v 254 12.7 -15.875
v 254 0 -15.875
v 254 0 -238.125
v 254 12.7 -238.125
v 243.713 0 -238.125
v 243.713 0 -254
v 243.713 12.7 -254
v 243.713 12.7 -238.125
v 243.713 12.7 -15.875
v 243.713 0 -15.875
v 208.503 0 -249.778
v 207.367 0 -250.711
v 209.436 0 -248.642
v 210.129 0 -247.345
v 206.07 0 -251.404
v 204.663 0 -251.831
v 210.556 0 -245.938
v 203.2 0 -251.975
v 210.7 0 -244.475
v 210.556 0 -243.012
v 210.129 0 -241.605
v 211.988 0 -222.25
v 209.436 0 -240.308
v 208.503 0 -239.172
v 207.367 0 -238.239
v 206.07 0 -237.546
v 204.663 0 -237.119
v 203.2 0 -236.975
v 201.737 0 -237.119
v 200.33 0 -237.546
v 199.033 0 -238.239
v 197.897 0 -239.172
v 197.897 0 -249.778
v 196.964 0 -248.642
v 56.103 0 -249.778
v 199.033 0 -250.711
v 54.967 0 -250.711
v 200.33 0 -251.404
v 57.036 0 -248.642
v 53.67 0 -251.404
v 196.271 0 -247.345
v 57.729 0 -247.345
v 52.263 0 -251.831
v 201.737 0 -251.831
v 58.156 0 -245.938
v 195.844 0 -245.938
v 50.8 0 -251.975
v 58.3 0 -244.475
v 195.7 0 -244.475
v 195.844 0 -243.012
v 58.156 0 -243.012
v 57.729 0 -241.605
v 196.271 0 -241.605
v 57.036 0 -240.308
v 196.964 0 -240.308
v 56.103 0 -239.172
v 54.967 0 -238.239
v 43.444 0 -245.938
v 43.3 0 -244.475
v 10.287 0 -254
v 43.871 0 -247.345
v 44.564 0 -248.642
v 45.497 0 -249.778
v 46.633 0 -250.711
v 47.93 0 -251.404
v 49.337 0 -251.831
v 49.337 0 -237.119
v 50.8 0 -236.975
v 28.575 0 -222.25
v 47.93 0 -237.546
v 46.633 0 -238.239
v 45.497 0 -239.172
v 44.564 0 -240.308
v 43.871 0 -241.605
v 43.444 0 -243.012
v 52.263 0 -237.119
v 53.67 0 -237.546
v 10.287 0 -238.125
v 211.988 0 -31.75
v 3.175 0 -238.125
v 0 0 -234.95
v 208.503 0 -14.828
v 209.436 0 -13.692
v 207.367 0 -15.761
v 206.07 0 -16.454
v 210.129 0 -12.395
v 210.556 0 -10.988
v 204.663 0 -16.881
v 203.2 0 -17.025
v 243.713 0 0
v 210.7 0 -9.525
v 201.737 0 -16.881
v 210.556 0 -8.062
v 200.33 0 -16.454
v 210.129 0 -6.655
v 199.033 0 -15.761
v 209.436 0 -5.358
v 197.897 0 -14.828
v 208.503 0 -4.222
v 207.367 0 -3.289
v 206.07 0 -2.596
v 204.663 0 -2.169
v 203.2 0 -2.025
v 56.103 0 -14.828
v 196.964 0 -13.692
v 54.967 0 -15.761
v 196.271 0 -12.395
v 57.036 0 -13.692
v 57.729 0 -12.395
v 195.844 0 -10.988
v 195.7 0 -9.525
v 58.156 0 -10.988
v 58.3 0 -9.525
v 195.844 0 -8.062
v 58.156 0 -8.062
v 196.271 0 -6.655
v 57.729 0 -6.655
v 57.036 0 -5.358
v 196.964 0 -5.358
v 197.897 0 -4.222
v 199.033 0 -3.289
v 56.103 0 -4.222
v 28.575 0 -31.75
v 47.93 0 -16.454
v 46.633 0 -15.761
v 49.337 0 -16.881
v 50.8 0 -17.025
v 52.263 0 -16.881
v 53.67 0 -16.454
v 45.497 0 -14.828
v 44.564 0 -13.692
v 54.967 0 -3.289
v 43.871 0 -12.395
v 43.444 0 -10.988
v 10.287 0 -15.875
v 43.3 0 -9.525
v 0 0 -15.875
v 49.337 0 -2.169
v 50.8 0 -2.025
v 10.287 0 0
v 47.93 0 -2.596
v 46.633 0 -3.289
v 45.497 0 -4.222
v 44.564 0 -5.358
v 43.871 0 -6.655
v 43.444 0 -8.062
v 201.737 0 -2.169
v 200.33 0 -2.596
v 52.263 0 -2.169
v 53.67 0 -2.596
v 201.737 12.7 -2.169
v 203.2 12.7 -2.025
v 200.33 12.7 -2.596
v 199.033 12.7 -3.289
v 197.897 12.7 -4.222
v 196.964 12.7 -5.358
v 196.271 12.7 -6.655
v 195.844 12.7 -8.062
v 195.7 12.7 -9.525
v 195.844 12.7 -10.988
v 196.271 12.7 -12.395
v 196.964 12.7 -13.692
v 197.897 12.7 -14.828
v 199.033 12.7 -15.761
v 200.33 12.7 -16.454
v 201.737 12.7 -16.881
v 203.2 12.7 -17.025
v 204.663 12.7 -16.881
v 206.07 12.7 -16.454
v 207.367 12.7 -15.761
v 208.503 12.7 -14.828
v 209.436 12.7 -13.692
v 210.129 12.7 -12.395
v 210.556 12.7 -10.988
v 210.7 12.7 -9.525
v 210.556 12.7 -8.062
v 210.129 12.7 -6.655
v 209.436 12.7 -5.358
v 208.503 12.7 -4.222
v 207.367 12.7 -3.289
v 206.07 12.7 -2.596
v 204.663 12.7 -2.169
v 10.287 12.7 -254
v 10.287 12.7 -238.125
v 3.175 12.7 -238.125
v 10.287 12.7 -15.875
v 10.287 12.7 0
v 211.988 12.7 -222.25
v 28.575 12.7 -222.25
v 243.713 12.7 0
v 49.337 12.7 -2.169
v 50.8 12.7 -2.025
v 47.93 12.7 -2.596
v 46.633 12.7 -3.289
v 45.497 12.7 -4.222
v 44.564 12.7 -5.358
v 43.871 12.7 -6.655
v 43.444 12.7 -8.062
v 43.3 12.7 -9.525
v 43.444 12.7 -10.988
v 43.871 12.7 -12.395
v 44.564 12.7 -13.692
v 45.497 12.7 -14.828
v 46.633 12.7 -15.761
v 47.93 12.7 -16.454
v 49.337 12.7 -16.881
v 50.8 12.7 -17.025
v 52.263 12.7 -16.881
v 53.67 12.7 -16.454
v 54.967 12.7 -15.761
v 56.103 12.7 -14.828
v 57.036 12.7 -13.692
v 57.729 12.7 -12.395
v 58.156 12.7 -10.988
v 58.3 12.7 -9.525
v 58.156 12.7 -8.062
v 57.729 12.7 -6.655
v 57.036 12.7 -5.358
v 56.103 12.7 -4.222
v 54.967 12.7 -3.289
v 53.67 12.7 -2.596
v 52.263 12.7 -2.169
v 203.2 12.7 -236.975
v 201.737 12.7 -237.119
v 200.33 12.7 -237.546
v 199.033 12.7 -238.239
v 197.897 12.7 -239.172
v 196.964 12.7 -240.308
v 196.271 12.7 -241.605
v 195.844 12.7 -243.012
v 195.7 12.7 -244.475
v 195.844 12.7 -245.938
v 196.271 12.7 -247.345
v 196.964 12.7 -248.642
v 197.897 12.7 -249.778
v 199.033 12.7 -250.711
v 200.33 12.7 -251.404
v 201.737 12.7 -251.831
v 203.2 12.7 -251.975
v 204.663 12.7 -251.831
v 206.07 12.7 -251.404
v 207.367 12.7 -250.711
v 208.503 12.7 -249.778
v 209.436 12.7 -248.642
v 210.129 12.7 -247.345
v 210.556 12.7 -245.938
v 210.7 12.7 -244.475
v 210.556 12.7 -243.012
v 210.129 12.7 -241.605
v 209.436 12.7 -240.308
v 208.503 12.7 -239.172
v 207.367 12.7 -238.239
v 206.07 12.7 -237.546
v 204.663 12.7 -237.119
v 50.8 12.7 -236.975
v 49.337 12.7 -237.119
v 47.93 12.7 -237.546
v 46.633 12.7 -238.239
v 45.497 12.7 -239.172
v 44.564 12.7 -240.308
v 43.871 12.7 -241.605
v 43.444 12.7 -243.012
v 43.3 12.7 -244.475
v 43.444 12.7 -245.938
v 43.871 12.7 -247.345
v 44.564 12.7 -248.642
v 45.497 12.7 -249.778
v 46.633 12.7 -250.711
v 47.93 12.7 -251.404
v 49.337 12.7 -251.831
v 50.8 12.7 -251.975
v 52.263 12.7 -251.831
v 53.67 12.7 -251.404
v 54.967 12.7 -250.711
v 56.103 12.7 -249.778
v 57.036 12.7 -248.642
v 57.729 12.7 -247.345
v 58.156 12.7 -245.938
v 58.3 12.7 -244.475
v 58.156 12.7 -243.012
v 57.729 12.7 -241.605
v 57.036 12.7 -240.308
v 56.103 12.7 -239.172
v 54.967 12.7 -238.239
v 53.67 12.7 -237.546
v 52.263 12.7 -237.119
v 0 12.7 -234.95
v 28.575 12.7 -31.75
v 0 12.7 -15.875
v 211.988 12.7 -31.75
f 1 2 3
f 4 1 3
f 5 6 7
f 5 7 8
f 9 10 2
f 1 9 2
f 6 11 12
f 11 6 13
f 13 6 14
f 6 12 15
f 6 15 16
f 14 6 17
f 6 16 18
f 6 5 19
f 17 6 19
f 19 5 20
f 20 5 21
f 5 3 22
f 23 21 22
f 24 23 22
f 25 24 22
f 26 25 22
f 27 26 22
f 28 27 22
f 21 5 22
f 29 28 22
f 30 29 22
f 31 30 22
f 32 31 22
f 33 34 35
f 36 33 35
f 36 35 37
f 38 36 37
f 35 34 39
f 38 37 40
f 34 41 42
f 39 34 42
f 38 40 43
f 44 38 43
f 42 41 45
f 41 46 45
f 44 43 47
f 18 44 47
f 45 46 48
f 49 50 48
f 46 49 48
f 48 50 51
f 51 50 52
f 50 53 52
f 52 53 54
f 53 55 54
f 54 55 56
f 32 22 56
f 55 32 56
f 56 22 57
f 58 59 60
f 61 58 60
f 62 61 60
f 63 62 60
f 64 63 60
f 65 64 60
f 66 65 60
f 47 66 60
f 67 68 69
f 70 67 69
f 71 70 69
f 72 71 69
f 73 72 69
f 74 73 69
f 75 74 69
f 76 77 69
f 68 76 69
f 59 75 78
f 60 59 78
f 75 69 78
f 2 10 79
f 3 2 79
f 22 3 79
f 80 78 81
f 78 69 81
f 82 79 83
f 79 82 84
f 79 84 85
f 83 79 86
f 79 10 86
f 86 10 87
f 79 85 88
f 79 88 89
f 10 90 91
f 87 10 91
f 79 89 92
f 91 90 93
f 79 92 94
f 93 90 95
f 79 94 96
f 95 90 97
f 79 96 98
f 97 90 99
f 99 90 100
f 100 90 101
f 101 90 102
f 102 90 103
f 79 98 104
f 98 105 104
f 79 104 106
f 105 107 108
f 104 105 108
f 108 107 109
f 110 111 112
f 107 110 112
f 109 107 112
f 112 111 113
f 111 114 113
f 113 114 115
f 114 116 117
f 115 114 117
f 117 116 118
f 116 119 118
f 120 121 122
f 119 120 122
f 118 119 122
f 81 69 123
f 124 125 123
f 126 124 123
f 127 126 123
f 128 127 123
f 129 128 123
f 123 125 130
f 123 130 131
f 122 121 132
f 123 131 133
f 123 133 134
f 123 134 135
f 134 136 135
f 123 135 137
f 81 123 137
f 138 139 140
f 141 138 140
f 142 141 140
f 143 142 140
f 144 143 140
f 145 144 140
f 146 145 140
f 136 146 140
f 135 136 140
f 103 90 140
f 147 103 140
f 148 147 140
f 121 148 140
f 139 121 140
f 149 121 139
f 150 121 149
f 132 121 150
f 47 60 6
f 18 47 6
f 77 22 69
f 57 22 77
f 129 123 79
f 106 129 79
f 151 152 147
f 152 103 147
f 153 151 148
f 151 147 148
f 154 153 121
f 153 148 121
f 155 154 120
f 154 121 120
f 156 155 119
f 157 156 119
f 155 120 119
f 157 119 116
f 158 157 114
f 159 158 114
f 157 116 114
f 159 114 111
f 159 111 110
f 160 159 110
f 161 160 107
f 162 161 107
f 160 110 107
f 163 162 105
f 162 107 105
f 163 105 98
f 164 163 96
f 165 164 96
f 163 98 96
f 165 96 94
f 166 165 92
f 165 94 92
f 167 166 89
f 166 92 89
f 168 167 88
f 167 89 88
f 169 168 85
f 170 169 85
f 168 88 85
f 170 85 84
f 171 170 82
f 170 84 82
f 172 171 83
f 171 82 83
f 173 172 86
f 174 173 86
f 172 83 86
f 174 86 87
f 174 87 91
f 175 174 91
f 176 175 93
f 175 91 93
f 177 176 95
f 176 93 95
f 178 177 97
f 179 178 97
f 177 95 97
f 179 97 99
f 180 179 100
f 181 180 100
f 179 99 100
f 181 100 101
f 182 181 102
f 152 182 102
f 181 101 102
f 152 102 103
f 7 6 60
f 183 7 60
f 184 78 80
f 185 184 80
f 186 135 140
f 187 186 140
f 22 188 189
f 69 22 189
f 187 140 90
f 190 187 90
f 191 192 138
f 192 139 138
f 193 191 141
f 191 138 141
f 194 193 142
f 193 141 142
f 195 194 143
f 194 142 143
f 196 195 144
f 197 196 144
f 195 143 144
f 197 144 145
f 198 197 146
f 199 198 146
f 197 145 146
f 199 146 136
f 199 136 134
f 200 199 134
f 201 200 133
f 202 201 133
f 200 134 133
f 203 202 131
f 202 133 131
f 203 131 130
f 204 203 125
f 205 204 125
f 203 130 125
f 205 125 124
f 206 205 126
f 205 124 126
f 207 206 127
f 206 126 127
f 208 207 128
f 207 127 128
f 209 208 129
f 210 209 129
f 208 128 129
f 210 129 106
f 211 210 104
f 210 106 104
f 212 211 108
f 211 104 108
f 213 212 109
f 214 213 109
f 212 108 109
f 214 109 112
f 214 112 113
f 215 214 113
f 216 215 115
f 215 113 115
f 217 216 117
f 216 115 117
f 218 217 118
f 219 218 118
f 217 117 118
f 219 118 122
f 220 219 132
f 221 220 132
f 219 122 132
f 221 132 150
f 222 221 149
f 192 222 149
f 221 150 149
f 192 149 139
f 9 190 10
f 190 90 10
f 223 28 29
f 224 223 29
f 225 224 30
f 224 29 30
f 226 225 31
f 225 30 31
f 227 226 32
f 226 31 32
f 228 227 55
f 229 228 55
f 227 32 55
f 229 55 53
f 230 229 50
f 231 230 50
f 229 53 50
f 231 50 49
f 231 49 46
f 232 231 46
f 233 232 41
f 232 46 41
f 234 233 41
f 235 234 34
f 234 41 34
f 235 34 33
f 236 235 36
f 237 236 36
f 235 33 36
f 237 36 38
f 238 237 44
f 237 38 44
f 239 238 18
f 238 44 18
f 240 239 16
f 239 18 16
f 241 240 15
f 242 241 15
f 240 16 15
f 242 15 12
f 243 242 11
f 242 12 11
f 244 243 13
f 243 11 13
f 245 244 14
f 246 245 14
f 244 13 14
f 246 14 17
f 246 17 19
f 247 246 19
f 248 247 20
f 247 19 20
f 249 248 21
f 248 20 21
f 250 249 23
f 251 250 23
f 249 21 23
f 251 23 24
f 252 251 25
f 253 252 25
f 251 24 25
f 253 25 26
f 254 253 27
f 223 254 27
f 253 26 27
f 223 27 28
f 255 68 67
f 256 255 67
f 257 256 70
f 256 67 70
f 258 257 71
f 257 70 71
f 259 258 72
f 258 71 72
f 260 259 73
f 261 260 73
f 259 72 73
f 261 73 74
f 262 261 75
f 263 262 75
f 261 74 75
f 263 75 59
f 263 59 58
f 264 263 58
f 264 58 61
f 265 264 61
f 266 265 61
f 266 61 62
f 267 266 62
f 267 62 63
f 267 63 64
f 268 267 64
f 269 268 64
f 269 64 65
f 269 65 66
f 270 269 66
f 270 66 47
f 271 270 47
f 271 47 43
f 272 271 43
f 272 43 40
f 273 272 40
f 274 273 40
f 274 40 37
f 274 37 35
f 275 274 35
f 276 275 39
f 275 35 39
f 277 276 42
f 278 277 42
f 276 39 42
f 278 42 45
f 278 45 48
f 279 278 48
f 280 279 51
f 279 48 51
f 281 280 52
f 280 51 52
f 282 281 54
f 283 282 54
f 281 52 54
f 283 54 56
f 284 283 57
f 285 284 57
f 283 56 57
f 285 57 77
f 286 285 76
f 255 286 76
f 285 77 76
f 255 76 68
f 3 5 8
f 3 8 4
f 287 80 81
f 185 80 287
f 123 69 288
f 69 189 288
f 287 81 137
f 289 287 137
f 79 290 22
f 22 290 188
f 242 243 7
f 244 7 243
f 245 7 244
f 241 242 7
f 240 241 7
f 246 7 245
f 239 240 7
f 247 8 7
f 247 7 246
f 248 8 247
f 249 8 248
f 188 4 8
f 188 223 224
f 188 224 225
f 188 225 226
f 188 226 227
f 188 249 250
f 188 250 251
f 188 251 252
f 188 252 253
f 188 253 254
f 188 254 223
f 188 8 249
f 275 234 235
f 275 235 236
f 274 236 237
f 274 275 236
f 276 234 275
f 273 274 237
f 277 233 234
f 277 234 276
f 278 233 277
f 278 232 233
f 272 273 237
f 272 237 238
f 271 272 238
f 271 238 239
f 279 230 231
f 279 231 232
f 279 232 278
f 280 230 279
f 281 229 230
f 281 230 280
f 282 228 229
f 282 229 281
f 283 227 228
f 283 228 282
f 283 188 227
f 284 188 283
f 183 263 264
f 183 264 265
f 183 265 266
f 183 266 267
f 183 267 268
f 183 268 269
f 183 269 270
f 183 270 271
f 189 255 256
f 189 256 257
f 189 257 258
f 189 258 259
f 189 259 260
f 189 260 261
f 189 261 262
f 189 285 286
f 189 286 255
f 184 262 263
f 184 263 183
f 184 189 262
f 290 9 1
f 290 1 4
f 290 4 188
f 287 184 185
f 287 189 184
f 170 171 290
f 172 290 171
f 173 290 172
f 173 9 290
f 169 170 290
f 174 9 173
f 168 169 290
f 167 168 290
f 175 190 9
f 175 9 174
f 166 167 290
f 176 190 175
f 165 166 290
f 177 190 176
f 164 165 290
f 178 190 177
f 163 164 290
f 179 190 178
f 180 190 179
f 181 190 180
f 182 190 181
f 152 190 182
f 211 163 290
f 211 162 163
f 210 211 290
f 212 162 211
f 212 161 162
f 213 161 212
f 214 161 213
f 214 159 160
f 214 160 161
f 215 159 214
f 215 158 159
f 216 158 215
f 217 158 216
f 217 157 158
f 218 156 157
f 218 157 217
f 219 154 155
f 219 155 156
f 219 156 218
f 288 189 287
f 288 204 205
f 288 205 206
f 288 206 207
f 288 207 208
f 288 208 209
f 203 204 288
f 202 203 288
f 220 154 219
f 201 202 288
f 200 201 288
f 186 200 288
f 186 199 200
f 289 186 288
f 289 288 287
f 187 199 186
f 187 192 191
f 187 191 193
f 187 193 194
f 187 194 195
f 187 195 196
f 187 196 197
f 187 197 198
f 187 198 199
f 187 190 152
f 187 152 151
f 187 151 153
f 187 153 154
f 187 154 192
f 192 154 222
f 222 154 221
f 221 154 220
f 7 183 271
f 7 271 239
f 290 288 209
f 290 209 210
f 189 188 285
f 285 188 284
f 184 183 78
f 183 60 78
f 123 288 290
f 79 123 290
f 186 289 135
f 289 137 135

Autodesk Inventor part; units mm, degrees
ref_plane "YZ Plane" through (0, 0, 0) normal (1, 0, 0) x (0, 1, 0)
ref_plane "XZ Plane" through (0, 0, 0) normal (0, 1, 0) x (-1, 0, 0)
ref_plane "XY Plane" through (0, 0, 0) normal (0, 0, 1) x (1, 0, 0)
sketch "Sketch1" plane through (0, 0, 0) normal (0, 1, 0) x (-1, 0, 0)
  line L0 (0, 0) -> (-254, 0)
  line L1 (-254, 0) -> (-254, -254)
  line L2 (-254, -254) -> (0, -254)
  line L3 (0, -254) -> (0, 0)
  line L4 (0, -15.875) -> (-10.287, -15.875)
  line L5 (-10.287, -15.875) -> (-10.287, 0)
  line L6 (-243.713, 0) -> (-243.713, -15.875)
  line L7 (-243.713, -15.875) -> (-254, -15.875)
  line L8 (-243.713, -254) -> (-243.713, -238.125)
  line L9 (-243.713, -238.125) -> (-254, -238.125)
  line L10 (-10.287, -254) -> (-10.287, -238.125)
  line L11 (-10.287, -238.125) -> (0, -238.125)
  dimension "d0" = 254
  dimension "d1" = 254
  dimension "d13" = 10.287
  dimension "d14" = 10.287
  dimension "d15" = 15.875
  dimension "d16" = 15.875
extrude "Extrusion1" add sketch "Sketch1" along normal blind 12.7 contours L5 L4 L3 L11 L10 L2 L8 L9 L1 L7 L6 L0
sketch "Sketch2" plane through (0, 12.7, 0) normal (0, 1, 0) x (1, 0, 0)
  line L0 (28.575, 31.75) -> (211.9884, 31.75)
  line L1 (211.9884, 31.75) -> (211.9884, 222.25)
  line L2 (211.9884, 222.25) -> (28.575, 222.25)
  line L3 (28.575, 222.25) -> (28.575, 31.75)
  line L4 (0, 15.875) -> (10.287, 15.875) projected
  line L5 (10.287, 15.875) -> (10.287, 0) projected
  line L6 (10.287, 0) -> (243.713, 0) projected
  line L7 (243.713, 0) -> (243.713, 15.875) projected
  line L8 (243.713, 15.875) -> (254, 15.875) projected
  line L9 (254, 15.875) -> (254, 238.125) projected
  line L10 (254, 238.125) -> (243.713, 238.125) projected
  line L11 (243.713, 238.125) -> (243.713, 254) projected
  line L12 (243.713, 254) -> (10.287, 254) projected
  line L13 (10.287, 254) -> (10.287, 238.125) projected
  line L14 (10.287, 238.125) -> (0, 238.125) projected
  line L15 (0, 238.125) -> (0, 15.875) projected
  point P0 (0, 0)
  point P1 (127, 0)
  point P2 (28.575, 127)
  point P3 (0, 127)
  dimension "d9" = 190.5
  dimension "d29" = 28.575
  dimension "d30" = 42.0116
extrude "Extrusion2" cut sketch "Sketch2" against normal through all contours L3 L2 L1 L0
sketch "Sketch3" plane through (0, 12.7, 0) normal (0, 1, 0) x (1, 0, 0)
  circle A0 centre (50.8, 9.525) radius 7.5 projected
  circle A1 centre (50.8, 244.475) radius 7.5 projected
  circle A2 centre (203.2, 244.475) radius 4 projected
  circle A3 centre (203.2, 244.475) radius 7.5 projected
  circle A4 centre (203.2, 9.525) radius 7.5 projected
  point P0 (0, 0)
hole "Hole1" at (50.8, 12.7, -9.525) at (50.8, 12.7, -244.475) at (203.2, 12.7, -9.525) at (203.2, 12.7, -244.475) direction (0, -1, 0) diameter 15 end through all
chamfer "Chamfer1" distance 3.175 angle 45 1 edges at (0, 6.35, -238.125)
equation "\"d14\" = d13"
properties part number "Carriage Sheet"
